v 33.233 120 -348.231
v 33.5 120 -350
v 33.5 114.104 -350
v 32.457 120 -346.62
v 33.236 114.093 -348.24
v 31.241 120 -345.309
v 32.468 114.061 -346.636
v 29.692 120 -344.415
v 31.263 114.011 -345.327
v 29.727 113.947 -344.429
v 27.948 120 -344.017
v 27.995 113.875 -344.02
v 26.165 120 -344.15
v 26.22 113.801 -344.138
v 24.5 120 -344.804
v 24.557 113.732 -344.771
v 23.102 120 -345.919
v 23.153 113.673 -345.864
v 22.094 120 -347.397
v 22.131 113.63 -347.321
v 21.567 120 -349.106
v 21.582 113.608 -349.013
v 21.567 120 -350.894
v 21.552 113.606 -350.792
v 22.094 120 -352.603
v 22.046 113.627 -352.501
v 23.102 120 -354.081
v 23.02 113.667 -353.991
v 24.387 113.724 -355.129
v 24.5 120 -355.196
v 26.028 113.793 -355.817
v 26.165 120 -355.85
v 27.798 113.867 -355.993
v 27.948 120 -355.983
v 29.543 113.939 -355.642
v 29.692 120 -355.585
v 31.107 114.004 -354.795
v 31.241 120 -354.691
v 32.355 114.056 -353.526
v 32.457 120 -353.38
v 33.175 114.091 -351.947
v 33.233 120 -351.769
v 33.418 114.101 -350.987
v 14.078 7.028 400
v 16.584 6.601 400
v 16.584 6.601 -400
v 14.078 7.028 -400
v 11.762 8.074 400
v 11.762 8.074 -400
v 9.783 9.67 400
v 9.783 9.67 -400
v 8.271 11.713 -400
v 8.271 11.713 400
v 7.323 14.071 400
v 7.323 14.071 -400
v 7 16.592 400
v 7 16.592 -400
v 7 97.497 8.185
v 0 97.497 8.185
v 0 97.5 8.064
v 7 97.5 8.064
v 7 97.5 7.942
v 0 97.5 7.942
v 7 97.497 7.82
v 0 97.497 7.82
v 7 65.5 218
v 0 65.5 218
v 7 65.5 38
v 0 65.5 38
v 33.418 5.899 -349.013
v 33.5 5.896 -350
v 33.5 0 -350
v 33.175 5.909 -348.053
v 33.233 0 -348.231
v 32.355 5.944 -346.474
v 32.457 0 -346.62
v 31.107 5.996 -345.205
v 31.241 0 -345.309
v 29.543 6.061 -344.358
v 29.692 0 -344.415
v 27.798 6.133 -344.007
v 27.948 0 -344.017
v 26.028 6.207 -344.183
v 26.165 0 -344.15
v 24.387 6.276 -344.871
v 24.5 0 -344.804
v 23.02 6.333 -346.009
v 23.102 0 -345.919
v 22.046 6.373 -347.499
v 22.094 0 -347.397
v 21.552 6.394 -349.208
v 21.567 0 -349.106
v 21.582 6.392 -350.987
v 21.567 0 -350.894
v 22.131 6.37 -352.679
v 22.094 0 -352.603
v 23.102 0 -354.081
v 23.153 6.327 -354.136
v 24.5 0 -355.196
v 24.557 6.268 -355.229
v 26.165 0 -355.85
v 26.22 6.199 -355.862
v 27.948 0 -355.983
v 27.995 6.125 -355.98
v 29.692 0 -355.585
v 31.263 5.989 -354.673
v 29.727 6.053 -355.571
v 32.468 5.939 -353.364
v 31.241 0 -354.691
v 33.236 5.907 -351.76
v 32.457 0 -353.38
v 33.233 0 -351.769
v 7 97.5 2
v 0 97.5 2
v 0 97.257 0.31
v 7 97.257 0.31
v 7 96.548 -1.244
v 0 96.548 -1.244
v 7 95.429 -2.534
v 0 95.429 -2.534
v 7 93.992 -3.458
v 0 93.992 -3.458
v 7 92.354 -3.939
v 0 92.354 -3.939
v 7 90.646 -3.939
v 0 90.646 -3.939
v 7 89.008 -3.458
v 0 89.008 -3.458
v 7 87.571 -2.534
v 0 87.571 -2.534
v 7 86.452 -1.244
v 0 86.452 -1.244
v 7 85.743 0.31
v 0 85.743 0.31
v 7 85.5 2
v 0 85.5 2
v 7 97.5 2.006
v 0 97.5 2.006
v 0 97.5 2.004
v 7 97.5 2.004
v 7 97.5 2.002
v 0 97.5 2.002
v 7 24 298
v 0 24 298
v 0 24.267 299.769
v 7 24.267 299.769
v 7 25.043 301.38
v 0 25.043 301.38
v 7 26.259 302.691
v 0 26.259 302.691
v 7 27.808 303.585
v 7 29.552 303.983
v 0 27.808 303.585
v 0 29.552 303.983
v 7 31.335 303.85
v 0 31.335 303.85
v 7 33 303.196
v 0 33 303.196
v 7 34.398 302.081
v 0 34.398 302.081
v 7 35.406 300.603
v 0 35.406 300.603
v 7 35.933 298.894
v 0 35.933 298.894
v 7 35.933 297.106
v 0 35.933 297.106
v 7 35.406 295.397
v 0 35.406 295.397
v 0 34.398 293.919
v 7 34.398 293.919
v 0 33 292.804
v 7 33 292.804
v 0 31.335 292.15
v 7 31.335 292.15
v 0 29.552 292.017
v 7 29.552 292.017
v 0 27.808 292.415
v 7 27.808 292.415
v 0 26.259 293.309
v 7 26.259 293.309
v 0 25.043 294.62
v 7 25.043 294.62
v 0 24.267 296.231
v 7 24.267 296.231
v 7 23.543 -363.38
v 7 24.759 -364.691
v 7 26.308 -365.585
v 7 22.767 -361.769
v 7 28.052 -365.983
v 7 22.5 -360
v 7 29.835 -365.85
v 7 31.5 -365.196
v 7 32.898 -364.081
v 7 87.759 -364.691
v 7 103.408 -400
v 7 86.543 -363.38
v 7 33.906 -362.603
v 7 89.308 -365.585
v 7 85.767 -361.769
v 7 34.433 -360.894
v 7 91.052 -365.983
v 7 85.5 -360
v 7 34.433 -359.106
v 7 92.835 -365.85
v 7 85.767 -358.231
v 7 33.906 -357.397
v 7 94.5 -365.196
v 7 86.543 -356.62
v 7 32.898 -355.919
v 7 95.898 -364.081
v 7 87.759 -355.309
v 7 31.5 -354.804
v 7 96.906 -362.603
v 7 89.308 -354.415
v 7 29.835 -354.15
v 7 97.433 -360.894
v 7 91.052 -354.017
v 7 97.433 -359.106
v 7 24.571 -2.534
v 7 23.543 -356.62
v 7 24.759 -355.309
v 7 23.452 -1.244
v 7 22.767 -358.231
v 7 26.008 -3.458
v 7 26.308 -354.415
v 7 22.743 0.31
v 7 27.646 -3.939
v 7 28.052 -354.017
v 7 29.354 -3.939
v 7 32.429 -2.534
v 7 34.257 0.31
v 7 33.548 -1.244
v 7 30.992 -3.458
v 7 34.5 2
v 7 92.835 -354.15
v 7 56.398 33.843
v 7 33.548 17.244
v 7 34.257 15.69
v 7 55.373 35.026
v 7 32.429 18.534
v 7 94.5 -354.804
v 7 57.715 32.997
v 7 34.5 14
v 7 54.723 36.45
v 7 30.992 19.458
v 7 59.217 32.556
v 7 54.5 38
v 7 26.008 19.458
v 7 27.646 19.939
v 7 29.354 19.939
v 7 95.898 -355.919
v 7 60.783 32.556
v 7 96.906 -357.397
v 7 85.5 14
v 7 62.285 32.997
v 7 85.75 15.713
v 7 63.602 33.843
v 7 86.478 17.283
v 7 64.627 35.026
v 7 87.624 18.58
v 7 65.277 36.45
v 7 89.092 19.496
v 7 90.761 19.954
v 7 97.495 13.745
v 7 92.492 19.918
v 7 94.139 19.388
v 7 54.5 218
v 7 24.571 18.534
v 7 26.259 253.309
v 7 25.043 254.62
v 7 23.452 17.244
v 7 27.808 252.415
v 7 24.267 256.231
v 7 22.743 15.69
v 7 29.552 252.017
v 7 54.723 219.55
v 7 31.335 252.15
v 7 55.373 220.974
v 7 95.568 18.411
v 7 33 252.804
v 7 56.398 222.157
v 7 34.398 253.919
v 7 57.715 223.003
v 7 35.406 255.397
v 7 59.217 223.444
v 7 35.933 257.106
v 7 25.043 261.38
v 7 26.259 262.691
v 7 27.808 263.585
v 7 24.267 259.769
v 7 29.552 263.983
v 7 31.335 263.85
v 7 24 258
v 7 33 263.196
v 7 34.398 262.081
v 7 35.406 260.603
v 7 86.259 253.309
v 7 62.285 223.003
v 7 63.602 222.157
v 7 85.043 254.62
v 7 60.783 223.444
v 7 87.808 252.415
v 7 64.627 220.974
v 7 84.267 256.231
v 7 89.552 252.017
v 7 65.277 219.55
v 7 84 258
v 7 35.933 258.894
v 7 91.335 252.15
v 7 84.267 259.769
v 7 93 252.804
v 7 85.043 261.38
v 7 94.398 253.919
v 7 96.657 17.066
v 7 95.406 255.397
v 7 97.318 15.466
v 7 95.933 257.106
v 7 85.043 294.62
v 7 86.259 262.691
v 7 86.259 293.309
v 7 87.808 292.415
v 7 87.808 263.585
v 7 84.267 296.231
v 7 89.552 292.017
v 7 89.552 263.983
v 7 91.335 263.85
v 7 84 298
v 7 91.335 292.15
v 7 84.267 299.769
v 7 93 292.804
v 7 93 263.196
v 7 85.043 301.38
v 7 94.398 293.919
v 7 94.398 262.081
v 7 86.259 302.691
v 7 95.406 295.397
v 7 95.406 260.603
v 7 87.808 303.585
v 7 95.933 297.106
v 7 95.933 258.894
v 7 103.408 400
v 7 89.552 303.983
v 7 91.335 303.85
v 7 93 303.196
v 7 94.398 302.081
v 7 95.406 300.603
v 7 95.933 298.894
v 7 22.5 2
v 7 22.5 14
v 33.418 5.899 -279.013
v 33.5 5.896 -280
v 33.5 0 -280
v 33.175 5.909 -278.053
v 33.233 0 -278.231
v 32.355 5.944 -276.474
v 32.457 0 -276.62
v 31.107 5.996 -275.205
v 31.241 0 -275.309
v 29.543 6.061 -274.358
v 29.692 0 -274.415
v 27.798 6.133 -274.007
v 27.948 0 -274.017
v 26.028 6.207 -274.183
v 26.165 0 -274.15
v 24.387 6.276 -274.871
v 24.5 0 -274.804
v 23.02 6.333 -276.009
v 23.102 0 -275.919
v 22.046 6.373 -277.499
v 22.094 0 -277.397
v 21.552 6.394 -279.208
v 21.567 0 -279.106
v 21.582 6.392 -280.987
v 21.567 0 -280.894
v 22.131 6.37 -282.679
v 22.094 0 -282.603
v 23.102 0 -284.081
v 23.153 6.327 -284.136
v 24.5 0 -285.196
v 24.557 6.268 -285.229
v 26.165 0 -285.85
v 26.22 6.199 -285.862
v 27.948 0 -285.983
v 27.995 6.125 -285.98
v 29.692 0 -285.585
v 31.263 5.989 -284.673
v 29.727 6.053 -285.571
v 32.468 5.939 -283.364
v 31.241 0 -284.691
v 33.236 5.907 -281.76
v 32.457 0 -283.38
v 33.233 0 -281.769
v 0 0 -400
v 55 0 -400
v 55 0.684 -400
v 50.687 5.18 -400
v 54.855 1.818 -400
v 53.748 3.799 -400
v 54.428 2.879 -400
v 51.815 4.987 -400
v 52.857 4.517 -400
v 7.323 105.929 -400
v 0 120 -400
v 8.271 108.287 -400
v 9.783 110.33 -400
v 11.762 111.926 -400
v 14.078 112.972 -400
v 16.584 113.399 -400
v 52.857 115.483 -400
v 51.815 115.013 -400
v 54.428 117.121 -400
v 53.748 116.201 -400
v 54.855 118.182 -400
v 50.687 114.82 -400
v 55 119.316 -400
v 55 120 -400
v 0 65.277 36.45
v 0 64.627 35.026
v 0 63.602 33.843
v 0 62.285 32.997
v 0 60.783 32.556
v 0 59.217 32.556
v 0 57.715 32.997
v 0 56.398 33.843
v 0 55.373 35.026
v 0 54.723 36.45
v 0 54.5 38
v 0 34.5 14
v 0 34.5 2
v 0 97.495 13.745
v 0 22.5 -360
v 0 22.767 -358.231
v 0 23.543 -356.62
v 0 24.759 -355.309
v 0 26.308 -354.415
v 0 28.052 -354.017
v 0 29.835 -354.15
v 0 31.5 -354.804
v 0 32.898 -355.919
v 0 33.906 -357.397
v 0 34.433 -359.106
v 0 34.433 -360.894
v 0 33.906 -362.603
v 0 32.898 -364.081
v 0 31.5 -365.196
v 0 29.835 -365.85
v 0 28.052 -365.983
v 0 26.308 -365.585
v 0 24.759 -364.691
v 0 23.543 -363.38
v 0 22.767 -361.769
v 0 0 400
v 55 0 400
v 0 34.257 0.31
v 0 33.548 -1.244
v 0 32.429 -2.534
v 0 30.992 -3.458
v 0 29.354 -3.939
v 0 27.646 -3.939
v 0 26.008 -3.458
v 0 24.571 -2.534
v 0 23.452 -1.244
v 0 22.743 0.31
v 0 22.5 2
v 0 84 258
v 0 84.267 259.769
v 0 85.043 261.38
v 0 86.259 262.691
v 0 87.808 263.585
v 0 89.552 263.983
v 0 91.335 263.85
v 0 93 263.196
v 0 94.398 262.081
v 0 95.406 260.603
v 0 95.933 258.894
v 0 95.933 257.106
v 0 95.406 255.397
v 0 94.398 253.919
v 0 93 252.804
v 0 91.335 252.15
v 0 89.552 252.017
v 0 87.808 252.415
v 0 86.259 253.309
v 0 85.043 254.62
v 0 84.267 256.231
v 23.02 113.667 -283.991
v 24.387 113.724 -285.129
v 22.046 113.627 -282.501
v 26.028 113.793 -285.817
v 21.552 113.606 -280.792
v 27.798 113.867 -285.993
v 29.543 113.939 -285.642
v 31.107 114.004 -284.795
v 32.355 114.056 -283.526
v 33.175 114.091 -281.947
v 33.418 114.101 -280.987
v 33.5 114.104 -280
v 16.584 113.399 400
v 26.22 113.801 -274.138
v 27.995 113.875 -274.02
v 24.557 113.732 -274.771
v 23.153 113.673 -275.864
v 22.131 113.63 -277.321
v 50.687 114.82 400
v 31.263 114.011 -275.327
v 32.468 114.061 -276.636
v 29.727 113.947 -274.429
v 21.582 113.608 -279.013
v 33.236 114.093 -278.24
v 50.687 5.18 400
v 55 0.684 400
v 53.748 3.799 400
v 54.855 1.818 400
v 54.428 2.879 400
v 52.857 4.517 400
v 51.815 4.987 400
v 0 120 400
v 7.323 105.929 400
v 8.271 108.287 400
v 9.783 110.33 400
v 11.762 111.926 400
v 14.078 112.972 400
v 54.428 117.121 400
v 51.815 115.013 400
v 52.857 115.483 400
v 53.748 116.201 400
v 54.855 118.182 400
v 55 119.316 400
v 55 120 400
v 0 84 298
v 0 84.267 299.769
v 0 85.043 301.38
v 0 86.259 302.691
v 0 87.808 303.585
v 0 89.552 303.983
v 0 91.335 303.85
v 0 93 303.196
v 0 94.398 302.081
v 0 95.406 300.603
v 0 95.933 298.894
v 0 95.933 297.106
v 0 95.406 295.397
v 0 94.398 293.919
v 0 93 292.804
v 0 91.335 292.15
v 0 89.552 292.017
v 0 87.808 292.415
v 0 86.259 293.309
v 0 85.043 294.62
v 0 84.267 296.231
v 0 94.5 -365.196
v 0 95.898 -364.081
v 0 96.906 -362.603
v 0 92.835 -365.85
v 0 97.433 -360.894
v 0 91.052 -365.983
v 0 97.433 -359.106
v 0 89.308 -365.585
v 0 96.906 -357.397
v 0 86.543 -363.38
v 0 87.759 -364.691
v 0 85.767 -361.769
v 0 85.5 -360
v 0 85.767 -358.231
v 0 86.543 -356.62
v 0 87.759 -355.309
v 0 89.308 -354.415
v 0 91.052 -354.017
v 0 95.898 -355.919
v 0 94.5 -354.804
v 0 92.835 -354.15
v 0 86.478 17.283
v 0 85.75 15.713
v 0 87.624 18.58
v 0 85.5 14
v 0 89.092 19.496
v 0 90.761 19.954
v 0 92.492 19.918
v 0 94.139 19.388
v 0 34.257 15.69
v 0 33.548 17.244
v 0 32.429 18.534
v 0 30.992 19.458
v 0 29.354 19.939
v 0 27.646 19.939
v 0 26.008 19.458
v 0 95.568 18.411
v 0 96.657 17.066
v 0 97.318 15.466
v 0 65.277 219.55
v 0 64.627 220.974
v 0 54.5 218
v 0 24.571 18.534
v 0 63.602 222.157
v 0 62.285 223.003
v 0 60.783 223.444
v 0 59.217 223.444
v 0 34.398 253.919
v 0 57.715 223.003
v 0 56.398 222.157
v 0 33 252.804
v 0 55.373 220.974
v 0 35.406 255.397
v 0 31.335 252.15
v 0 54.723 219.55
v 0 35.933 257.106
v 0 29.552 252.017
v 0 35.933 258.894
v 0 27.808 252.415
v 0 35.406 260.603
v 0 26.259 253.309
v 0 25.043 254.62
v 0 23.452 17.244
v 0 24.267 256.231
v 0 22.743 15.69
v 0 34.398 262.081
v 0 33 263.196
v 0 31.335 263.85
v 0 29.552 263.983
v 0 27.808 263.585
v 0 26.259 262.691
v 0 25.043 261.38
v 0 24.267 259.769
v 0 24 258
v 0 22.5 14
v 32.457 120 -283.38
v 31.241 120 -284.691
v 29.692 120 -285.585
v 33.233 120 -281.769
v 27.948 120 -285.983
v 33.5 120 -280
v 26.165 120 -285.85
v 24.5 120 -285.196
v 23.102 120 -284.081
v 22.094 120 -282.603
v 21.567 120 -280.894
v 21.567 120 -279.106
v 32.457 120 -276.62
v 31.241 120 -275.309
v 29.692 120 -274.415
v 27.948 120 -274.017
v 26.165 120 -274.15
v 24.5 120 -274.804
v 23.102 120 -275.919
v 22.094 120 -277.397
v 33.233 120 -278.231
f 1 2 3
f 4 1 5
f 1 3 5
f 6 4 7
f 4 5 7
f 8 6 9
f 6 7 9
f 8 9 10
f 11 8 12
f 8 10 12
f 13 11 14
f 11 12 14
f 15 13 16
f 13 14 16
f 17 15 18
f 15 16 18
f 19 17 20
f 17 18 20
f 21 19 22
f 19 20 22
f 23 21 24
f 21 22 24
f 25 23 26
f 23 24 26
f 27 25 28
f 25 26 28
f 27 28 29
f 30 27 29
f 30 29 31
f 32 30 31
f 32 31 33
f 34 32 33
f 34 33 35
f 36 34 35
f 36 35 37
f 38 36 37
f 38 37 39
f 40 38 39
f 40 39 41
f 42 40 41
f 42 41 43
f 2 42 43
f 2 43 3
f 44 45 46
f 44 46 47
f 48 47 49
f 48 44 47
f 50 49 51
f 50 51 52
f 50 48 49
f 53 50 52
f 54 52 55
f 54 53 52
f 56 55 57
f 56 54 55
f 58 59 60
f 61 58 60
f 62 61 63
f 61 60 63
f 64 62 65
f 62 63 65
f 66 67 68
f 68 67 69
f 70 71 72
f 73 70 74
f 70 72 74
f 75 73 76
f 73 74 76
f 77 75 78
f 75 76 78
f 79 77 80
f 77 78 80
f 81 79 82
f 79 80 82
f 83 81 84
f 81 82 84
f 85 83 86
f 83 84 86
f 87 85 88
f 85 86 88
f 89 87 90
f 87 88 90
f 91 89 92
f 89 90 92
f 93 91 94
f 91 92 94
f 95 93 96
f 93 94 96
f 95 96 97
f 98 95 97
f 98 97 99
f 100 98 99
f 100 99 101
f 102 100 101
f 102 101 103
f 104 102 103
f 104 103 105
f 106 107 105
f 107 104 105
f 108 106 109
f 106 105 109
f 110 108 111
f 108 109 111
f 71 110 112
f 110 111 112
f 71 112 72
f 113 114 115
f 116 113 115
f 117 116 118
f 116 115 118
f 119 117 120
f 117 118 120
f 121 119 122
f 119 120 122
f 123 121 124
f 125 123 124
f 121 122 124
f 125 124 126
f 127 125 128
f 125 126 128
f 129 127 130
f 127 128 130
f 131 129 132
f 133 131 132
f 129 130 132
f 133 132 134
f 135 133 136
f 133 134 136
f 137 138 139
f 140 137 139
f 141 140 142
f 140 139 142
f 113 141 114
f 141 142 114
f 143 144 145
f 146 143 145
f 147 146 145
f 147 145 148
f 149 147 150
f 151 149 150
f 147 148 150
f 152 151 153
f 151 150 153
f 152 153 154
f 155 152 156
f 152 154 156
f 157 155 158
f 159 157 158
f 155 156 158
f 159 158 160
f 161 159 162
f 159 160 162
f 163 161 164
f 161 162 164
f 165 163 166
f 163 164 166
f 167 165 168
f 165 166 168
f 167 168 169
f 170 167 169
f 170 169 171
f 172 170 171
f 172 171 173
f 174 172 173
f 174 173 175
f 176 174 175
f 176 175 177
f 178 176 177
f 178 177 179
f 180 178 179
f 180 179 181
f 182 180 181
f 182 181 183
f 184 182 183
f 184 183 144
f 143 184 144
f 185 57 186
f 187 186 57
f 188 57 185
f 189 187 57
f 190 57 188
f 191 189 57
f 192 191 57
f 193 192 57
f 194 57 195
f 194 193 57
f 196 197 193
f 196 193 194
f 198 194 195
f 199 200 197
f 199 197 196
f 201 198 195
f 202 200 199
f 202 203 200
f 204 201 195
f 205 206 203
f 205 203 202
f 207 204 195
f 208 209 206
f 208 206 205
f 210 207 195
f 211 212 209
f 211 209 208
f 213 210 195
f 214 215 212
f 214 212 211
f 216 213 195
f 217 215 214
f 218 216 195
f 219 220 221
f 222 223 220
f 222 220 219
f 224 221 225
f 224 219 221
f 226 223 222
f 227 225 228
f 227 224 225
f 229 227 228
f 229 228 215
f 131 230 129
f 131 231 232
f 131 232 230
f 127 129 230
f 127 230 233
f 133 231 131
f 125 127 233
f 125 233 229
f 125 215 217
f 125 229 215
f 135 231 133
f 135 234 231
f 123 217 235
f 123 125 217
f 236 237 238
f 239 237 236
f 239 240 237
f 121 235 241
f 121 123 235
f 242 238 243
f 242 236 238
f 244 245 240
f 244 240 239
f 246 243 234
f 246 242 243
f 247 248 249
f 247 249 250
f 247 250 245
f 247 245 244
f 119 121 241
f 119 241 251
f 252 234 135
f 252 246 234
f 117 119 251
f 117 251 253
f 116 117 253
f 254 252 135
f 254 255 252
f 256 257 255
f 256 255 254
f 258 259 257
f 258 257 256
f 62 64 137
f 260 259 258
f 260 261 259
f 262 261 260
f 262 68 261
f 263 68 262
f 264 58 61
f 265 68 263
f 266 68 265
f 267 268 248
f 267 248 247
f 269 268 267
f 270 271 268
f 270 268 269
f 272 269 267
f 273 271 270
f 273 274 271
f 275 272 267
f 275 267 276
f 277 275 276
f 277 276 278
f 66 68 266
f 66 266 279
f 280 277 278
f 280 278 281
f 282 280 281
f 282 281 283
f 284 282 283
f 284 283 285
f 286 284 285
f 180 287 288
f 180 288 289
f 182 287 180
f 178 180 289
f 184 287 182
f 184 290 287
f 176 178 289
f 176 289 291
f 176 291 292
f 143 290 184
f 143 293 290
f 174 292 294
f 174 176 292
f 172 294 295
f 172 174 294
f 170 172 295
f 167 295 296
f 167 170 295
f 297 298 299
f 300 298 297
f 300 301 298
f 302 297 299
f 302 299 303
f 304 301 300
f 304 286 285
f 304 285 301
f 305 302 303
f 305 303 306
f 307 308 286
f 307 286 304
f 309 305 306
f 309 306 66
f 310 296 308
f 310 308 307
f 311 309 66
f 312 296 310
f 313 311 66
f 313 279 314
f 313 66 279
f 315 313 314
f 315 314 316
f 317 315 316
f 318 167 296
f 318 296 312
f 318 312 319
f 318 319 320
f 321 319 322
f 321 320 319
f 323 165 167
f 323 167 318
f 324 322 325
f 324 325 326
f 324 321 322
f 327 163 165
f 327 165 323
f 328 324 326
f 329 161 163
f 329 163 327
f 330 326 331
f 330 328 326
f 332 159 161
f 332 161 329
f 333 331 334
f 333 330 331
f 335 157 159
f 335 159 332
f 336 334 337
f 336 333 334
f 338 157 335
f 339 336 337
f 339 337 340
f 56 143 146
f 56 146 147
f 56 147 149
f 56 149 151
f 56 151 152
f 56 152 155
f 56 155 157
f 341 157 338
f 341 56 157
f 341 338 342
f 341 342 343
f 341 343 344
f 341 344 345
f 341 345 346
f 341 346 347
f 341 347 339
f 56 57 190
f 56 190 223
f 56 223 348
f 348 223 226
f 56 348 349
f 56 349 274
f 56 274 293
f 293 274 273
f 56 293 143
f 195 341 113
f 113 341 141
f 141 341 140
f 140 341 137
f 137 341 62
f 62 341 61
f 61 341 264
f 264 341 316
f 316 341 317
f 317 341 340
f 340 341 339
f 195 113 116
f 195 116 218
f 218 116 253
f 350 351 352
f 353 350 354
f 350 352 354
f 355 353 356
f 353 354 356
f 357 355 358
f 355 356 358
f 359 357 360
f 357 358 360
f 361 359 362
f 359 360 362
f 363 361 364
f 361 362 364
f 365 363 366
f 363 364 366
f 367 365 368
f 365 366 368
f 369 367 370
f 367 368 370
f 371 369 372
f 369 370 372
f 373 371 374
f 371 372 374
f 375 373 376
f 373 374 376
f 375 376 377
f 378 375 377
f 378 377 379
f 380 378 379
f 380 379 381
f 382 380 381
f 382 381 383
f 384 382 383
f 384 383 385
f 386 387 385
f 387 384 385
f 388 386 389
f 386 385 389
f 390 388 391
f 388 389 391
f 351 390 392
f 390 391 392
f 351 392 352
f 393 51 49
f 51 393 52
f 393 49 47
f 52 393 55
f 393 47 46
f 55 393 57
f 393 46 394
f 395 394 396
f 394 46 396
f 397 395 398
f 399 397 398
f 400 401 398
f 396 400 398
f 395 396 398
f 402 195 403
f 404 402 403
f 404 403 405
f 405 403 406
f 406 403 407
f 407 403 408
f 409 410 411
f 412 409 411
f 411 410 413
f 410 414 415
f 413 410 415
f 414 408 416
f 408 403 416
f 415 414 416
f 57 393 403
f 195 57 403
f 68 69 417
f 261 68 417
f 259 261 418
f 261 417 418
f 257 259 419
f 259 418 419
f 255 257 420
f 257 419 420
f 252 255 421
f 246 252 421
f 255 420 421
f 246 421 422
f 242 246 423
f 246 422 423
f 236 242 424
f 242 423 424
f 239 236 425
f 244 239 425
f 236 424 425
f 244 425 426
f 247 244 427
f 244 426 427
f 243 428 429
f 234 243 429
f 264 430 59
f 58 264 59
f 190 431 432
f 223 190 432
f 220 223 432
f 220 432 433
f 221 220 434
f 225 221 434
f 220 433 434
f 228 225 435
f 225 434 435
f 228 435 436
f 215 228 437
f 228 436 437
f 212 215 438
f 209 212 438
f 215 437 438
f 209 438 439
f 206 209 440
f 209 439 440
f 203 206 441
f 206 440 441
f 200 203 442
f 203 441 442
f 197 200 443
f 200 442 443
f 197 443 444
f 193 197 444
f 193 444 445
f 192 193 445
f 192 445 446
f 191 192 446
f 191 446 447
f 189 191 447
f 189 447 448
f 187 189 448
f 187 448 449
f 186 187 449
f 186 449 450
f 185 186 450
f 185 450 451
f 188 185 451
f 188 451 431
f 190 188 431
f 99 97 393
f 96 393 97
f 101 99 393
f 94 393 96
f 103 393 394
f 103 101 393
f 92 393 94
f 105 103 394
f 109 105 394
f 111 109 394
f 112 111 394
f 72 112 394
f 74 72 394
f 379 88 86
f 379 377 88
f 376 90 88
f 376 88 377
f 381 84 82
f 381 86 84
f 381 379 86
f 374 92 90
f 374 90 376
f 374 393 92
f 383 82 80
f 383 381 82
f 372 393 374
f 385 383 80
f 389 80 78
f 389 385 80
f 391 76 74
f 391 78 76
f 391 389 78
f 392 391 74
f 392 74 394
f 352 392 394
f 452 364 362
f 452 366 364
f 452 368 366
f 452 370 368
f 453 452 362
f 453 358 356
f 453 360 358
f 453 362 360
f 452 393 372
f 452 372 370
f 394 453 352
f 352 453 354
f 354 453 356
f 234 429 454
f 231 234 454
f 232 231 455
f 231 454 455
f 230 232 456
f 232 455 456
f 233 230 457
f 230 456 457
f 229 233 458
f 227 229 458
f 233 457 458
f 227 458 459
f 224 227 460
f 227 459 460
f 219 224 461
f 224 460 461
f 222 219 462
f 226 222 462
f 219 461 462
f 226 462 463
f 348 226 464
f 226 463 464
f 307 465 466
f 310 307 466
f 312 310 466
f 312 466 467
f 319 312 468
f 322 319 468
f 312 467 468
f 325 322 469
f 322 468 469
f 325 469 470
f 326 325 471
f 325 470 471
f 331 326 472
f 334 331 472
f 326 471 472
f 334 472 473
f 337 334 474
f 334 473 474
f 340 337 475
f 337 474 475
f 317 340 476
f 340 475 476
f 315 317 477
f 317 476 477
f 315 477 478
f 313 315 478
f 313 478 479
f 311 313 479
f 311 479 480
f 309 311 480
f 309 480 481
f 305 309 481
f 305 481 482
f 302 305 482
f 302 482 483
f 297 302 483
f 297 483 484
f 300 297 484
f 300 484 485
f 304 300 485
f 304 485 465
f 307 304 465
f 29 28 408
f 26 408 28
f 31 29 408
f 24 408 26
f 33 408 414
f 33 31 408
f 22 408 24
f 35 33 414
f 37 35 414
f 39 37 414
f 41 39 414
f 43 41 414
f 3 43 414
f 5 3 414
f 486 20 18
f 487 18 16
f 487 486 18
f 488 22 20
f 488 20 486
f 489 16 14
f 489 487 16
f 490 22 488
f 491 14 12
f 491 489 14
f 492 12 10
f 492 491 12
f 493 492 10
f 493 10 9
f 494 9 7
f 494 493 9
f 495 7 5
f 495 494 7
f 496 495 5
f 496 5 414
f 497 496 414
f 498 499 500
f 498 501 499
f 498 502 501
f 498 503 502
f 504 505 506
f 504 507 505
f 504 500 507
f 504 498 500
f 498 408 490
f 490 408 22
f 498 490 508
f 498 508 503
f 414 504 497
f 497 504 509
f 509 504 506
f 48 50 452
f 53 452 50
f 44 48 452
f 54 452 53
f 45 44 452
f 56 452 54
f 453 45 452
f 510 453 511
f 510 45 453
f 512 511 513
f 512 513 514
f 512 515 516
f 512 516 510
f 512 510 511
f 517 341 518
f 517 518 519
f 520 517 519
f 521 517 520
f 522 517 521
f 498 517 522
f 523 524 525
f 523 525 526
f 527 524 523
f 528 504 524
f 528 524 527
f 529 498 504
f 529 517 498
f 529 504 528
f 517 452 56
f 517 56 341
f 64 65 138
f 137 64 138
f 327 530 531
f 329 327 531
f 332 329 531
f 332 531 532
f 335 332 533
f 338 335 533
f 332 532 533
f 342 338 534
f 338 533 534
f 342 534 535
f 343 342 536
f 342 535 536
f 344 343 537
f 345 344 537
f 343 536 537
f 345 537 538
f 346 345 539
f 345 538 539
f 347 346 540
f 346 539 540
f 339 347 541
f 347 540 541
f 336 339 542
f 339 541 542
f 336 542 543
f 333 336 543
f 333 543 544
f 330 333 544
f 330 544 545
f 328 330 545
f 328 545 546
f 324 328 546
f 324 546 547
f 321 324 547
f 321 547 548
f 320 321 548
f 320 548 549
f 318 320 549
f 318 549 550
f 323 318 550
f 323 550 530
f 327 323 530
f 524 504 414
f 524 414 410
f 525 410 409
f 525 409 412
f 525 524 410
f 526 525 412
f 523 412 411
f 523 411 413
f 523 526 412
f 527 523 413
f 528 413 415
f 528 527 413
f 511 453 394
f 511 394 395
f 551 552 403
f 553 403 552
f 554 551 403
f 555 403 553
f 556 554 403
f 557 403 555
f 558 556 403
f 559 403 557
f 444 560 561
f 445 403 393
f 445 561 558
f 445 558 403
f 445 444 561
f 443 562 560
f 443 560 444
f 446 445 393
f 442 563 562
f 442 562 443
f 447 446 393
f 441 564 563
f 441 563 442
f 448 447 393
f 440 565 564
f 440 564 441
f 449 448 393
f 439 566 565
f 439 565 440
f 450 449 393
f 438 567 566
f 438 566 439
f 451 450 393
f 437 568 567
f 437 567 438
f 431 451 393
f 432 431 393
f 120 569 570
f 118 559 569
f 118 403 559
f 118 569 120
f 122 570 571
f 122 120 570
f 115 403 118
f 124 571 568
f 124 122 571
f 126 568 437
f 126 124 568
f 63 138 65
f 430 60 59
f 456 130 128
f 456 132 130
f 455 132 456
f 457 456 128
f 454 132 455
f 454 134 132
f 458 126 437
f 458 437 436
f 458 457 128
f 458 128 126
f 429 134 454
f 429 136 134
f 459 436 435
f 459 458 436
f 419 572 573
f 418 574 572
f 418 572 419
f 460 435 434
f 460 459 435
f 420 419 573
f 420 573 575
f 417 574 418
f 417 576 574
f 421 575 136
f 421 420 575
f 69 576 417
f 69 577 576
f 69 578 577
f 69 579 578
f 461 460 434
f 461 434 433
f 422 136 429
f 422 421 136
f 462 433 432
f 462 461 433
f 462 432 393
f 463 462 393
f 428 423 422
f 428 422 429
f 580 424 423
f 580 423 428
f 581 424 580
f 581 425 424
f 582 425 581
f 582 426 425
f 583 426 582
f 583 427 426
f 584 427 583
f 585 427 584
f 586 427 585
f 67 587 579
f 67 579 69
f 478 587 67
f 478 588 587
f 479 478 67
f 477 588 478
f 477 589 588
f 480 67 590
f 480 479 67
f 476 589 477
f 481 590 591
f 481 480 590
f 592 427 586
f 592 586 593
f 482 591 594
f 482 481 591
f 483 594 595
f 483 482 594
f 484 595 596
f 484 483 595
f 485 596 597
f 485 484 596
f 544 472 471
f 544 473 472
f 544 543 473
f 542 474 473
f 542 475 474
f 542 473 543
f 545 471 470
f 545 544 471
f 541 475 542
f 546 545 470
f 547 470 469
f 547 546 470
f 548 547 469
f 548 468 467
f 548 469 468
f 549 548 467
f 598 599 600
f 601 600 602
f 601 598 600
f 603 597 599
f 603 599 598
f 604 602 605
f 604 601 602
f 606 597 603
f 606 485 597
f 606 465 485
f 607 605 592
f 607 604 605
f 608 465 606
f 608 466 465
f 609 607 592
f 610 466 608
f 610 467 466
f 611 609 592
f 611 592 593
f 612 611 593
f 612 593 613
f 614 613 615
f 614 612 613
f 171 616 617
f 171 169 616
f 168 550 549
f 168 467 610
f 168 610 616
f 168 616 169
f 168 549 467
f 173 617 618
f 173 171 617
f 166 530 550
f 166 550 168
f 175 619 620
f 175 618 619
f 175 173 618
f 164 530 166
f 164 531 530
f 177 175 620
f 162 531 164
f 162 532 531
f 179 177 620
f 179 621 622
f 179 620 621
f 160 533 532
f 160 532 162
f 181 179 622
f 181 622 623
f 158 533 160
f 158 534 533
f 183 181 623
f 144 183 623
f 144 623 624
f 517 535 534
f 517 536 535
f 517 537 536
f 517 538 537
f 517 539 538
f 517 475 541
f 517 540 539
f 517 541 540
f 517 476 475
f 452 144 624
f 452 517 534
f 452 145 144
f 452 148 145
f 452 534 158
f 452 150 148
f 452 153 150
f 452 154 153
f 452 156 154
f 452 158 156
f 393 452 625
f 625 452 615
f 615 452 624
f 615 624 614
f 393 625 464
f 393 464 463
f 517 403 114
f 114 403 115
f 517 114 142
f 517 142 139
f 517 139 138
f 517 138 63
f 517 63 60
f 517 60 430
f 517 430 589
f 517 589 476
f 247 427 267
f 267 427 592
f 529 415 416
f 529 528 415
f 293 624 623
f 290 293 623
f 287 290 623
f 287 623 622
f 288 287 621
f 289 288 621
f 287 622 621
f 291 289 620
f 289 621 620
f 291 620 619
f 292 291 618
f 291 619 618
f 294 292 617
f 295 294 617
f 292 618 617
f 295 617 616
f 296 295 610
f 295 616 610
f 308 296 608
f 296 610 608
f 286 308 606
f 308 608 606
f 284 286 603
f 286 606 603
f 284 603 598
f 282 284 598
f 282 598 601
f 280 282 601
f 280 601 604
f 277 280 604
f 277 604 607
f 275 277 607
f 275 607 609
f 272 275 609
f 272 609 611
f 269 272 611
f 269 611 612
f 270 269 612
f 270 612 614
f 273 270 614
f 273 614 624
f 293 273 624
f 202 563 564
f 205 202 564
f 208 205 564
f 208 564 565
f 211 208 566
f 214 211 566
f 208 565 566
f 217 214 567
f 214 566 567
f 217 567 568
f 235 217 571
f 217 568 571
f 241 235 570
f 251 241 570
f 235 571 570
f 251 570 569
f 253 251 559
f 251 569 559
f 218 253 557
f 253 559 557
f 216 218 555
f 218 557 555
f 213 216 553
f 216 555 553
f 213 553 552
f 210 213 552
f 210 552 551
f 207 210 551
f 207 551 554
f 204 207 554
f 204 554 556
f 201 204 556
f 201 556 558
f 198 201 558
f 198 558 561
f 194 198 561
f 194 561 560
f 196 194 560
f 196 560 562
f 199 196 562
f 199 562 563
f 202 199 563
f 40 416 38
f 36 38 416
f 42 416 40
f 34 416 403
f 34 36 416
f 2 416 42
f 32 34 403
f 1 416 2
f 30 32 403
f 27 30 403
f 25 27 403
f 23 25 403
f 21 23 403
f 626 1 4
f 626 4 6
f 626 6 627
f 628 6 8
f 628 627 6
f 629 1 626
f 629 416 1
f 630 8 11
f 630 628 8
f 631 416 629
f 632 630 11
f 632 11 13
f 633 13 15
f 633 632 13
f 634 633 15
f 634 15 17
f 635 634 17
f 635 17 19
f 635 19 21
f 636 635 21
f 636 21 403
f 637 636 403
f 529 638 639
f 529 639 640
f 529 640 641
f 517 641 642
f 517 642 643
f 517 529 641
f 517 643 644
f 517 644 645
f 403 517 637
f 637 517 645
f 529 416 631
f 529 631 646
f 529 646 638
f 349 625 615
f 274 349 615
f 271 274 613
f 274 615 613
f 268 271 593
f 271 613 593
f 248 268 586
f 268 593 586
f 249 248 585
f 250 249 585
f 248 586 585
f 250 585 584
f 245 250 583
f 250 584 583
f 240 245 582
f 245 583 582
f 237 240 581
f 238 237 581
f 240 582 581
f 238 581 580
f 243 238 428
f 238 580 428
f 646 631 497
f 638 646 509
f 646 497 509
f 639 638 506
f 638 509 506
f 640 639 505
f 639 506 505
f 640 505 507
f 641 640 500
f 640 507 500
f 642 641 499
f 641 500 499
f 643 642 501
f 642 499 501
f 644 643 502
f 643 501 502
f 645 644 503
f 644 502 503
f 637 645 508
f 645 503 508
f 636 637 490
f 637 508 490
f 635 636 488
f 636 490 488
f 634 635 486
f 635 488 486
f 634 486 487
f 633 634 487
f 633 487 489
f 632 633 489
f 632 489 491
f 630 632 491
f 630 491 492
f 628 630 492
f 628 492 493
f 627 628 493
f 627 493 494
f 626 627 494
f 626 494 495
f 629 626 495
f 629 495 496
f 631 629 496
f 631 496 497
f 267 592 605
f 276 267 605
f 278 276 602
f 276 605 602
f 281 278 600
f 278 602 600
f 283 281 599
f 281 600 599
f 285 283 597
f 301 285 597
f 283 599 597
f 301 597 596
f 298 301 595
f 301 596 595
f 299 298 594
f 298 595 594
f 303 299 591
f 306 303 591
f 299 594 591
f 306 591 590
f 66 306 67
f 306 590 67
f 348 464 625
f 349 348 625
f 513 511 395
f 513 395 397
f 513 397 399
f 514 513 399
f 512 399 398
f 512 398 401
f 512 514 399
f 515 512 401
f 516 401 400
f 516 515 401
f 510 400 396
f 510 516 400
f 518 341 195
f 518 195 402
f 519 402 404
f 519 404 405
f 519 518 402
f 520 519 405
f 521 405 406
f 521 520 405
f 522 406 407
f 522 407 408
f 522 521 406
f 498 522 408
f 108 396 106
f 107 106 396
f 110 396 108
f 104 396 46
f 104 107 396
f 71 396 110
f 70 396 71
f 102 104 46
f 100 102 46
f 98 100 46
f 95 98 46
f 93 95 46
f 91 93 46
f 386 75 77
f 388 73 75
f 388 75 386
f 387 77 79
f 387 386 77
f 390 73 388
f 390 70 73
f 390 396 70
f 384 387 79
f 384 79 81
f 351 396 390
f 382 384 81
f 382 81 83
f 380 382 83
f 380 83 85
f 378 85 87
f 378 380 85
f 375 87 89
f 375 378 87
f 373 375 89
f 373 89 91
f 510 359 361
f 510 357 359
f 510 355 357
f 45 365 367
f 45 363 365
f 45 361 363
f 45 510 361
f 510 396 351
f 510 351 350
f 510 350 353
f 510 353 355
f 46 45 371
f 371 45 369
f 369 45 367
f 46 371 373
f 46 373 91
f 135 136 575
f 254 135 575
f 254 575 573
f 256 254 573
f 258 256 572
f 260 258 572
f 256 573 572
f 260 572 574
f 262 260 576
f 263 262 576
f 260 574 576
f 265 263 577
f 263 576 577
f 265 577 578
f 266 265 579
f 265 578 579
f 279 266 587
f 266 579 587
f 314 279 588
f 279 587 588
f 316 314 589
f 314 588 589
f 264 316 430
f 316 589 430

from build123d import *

# Parameters (mm, degrees)
F1_DEPTH = 400
F2_R     = 6
F3_DEPTH = 55.001
F4_R     = 6
F5_DEPTH = 120.001


# Not quite as in the source:
# - a feature names something its author has since deleted; it is built from what else it names


with BuildPart() as f1:
    # F0 (on Top) → F1 (new body, symmetric)
    with BuildSketch(Plane.XY):
        with BuildLine():
            Line((0, 120), (0, 0))
            Line((0, 0), (55, 0))
            Line((55, 0), (55, 0.683595444))
            ThreePointArc((55, 0.683595444), (53.7475389551, 3.7986380977), (50.6873374512, 5.1796942729))
            Line((50.6873374512, 5.1796942729), (16.5836945529, 6.6006793936))
            ThreePointArc((16.5836945529, 6.6006793936), (9.7832467663, 9.6696931162), (7, 16.5920101246))
            Line((7, 16.5920101246), (7, 103.4079898754))
            ThreePointArc((7, 103.4079898754), (9.7832467663, 110.3303068838), (16.5836945529, 113.3993206064))
            Line((16.5836945529, 113.3993206064), (50.6873374512, 114.8203057271))
            ThreePointArc((50.6873374512, 114.8203057271), (53.7475389551, 116.2013619023), (55, 119.316404556))
            Line((55, 119.316404556), (55, 120))
            Line((55, 120), (0, 120))
        make_face()
    extrude(amount=F1_DEPTH, both=True)

    # F2 (on face) → F3 (cut, through all)
    with BuildSketch(Plane(origin=(0, 0, 0), x_dir=(0, -1, 0), z_dir=(-1, 0, 0))):
        with Locations((-90, 298)):
            Circle(F2_R)
        with Locations((-30, 298)):
            Circle(F2_R)
        with Locations((-30, 258)):
            Circle(F2_R)
        with Locations((-90, 258)):
            Circle(F2_R)
        with BuildLine():
            Line((-97.4973066239, 7.8202411081), (-97.4971376848, 8.1853094437))
            ThreePointArc((-97.4971376848, 8.1853094437), (-97.4999993576, 8.0027765611), (-97.4973066239, 7.8202411081))
        make_face()
        with Locations((-91.5, -360)):
            Circle(F2_R)
        with Locations((-28.5, -360)):
            Circle(F2_R)
        with BuildLine():
            Line((-97.4945650308, 13.7446764959), (-97.4971376848, 8.1853094437))
            Line((-97.4971376848, 8.1853094437), (-97.4973066239, 7.8202411081))
            Line((-97.4973066239, 7.8202411081), (-97.4999974302, 2.0055531216))
            ThreePointArc((-97.4999974302, 2.0055531216), (-97.4999993576, 2.0027765611), (-97.5, 2))
            ThreePointArc((-97.5, 2), (-91.5, -4), (-85.5, 2))
            Line((-85.5, 2), (-85.5, 14))
            ThreePointArc((-85.5, 14), (-91.6276906718, 19.9986411038), (-97.4945650308, 13.7446764959))
        make_face()
        with BuildLine():
            Line((-22.5, 2), (-22.5, 14))
            ThreePointArc((-22.5, 14), (-28.5, 20), (-34.5, 14))
            Line((-34.5, 14), (-34.5, 2))
            ThreePointArc((-34.5, 2), (-28.5, -4), (-22.5, 2))
        make_face()
        with BuildLine():
            Line((-65.5, 218), (-65.5, 38))
            ThreePointArc((-65.5, 38), (-60, 32.5), (-54.5, 38))
            Line((-54.5, 38), (-54.5, 218))
            ThreePointArc((-54.5, 218), (-60, 223.5), (-65.5, 218))
        make_face()
    extrude(amount=-F3_DEPTH, mode=Mode.SUBTRACT)

    # F4 (on face) → F5 (cut, through all)
    with BuildSketch(Plane.XZ):
        with Locations((27.5, -280)):
            Circle(F4_R)
        with Locations((27.5, -350)):
            Circle(F4_R)
    extrude(amount=-F5_DEPTH, mode=Mode.SUBTRACT)


solid = f1.part
